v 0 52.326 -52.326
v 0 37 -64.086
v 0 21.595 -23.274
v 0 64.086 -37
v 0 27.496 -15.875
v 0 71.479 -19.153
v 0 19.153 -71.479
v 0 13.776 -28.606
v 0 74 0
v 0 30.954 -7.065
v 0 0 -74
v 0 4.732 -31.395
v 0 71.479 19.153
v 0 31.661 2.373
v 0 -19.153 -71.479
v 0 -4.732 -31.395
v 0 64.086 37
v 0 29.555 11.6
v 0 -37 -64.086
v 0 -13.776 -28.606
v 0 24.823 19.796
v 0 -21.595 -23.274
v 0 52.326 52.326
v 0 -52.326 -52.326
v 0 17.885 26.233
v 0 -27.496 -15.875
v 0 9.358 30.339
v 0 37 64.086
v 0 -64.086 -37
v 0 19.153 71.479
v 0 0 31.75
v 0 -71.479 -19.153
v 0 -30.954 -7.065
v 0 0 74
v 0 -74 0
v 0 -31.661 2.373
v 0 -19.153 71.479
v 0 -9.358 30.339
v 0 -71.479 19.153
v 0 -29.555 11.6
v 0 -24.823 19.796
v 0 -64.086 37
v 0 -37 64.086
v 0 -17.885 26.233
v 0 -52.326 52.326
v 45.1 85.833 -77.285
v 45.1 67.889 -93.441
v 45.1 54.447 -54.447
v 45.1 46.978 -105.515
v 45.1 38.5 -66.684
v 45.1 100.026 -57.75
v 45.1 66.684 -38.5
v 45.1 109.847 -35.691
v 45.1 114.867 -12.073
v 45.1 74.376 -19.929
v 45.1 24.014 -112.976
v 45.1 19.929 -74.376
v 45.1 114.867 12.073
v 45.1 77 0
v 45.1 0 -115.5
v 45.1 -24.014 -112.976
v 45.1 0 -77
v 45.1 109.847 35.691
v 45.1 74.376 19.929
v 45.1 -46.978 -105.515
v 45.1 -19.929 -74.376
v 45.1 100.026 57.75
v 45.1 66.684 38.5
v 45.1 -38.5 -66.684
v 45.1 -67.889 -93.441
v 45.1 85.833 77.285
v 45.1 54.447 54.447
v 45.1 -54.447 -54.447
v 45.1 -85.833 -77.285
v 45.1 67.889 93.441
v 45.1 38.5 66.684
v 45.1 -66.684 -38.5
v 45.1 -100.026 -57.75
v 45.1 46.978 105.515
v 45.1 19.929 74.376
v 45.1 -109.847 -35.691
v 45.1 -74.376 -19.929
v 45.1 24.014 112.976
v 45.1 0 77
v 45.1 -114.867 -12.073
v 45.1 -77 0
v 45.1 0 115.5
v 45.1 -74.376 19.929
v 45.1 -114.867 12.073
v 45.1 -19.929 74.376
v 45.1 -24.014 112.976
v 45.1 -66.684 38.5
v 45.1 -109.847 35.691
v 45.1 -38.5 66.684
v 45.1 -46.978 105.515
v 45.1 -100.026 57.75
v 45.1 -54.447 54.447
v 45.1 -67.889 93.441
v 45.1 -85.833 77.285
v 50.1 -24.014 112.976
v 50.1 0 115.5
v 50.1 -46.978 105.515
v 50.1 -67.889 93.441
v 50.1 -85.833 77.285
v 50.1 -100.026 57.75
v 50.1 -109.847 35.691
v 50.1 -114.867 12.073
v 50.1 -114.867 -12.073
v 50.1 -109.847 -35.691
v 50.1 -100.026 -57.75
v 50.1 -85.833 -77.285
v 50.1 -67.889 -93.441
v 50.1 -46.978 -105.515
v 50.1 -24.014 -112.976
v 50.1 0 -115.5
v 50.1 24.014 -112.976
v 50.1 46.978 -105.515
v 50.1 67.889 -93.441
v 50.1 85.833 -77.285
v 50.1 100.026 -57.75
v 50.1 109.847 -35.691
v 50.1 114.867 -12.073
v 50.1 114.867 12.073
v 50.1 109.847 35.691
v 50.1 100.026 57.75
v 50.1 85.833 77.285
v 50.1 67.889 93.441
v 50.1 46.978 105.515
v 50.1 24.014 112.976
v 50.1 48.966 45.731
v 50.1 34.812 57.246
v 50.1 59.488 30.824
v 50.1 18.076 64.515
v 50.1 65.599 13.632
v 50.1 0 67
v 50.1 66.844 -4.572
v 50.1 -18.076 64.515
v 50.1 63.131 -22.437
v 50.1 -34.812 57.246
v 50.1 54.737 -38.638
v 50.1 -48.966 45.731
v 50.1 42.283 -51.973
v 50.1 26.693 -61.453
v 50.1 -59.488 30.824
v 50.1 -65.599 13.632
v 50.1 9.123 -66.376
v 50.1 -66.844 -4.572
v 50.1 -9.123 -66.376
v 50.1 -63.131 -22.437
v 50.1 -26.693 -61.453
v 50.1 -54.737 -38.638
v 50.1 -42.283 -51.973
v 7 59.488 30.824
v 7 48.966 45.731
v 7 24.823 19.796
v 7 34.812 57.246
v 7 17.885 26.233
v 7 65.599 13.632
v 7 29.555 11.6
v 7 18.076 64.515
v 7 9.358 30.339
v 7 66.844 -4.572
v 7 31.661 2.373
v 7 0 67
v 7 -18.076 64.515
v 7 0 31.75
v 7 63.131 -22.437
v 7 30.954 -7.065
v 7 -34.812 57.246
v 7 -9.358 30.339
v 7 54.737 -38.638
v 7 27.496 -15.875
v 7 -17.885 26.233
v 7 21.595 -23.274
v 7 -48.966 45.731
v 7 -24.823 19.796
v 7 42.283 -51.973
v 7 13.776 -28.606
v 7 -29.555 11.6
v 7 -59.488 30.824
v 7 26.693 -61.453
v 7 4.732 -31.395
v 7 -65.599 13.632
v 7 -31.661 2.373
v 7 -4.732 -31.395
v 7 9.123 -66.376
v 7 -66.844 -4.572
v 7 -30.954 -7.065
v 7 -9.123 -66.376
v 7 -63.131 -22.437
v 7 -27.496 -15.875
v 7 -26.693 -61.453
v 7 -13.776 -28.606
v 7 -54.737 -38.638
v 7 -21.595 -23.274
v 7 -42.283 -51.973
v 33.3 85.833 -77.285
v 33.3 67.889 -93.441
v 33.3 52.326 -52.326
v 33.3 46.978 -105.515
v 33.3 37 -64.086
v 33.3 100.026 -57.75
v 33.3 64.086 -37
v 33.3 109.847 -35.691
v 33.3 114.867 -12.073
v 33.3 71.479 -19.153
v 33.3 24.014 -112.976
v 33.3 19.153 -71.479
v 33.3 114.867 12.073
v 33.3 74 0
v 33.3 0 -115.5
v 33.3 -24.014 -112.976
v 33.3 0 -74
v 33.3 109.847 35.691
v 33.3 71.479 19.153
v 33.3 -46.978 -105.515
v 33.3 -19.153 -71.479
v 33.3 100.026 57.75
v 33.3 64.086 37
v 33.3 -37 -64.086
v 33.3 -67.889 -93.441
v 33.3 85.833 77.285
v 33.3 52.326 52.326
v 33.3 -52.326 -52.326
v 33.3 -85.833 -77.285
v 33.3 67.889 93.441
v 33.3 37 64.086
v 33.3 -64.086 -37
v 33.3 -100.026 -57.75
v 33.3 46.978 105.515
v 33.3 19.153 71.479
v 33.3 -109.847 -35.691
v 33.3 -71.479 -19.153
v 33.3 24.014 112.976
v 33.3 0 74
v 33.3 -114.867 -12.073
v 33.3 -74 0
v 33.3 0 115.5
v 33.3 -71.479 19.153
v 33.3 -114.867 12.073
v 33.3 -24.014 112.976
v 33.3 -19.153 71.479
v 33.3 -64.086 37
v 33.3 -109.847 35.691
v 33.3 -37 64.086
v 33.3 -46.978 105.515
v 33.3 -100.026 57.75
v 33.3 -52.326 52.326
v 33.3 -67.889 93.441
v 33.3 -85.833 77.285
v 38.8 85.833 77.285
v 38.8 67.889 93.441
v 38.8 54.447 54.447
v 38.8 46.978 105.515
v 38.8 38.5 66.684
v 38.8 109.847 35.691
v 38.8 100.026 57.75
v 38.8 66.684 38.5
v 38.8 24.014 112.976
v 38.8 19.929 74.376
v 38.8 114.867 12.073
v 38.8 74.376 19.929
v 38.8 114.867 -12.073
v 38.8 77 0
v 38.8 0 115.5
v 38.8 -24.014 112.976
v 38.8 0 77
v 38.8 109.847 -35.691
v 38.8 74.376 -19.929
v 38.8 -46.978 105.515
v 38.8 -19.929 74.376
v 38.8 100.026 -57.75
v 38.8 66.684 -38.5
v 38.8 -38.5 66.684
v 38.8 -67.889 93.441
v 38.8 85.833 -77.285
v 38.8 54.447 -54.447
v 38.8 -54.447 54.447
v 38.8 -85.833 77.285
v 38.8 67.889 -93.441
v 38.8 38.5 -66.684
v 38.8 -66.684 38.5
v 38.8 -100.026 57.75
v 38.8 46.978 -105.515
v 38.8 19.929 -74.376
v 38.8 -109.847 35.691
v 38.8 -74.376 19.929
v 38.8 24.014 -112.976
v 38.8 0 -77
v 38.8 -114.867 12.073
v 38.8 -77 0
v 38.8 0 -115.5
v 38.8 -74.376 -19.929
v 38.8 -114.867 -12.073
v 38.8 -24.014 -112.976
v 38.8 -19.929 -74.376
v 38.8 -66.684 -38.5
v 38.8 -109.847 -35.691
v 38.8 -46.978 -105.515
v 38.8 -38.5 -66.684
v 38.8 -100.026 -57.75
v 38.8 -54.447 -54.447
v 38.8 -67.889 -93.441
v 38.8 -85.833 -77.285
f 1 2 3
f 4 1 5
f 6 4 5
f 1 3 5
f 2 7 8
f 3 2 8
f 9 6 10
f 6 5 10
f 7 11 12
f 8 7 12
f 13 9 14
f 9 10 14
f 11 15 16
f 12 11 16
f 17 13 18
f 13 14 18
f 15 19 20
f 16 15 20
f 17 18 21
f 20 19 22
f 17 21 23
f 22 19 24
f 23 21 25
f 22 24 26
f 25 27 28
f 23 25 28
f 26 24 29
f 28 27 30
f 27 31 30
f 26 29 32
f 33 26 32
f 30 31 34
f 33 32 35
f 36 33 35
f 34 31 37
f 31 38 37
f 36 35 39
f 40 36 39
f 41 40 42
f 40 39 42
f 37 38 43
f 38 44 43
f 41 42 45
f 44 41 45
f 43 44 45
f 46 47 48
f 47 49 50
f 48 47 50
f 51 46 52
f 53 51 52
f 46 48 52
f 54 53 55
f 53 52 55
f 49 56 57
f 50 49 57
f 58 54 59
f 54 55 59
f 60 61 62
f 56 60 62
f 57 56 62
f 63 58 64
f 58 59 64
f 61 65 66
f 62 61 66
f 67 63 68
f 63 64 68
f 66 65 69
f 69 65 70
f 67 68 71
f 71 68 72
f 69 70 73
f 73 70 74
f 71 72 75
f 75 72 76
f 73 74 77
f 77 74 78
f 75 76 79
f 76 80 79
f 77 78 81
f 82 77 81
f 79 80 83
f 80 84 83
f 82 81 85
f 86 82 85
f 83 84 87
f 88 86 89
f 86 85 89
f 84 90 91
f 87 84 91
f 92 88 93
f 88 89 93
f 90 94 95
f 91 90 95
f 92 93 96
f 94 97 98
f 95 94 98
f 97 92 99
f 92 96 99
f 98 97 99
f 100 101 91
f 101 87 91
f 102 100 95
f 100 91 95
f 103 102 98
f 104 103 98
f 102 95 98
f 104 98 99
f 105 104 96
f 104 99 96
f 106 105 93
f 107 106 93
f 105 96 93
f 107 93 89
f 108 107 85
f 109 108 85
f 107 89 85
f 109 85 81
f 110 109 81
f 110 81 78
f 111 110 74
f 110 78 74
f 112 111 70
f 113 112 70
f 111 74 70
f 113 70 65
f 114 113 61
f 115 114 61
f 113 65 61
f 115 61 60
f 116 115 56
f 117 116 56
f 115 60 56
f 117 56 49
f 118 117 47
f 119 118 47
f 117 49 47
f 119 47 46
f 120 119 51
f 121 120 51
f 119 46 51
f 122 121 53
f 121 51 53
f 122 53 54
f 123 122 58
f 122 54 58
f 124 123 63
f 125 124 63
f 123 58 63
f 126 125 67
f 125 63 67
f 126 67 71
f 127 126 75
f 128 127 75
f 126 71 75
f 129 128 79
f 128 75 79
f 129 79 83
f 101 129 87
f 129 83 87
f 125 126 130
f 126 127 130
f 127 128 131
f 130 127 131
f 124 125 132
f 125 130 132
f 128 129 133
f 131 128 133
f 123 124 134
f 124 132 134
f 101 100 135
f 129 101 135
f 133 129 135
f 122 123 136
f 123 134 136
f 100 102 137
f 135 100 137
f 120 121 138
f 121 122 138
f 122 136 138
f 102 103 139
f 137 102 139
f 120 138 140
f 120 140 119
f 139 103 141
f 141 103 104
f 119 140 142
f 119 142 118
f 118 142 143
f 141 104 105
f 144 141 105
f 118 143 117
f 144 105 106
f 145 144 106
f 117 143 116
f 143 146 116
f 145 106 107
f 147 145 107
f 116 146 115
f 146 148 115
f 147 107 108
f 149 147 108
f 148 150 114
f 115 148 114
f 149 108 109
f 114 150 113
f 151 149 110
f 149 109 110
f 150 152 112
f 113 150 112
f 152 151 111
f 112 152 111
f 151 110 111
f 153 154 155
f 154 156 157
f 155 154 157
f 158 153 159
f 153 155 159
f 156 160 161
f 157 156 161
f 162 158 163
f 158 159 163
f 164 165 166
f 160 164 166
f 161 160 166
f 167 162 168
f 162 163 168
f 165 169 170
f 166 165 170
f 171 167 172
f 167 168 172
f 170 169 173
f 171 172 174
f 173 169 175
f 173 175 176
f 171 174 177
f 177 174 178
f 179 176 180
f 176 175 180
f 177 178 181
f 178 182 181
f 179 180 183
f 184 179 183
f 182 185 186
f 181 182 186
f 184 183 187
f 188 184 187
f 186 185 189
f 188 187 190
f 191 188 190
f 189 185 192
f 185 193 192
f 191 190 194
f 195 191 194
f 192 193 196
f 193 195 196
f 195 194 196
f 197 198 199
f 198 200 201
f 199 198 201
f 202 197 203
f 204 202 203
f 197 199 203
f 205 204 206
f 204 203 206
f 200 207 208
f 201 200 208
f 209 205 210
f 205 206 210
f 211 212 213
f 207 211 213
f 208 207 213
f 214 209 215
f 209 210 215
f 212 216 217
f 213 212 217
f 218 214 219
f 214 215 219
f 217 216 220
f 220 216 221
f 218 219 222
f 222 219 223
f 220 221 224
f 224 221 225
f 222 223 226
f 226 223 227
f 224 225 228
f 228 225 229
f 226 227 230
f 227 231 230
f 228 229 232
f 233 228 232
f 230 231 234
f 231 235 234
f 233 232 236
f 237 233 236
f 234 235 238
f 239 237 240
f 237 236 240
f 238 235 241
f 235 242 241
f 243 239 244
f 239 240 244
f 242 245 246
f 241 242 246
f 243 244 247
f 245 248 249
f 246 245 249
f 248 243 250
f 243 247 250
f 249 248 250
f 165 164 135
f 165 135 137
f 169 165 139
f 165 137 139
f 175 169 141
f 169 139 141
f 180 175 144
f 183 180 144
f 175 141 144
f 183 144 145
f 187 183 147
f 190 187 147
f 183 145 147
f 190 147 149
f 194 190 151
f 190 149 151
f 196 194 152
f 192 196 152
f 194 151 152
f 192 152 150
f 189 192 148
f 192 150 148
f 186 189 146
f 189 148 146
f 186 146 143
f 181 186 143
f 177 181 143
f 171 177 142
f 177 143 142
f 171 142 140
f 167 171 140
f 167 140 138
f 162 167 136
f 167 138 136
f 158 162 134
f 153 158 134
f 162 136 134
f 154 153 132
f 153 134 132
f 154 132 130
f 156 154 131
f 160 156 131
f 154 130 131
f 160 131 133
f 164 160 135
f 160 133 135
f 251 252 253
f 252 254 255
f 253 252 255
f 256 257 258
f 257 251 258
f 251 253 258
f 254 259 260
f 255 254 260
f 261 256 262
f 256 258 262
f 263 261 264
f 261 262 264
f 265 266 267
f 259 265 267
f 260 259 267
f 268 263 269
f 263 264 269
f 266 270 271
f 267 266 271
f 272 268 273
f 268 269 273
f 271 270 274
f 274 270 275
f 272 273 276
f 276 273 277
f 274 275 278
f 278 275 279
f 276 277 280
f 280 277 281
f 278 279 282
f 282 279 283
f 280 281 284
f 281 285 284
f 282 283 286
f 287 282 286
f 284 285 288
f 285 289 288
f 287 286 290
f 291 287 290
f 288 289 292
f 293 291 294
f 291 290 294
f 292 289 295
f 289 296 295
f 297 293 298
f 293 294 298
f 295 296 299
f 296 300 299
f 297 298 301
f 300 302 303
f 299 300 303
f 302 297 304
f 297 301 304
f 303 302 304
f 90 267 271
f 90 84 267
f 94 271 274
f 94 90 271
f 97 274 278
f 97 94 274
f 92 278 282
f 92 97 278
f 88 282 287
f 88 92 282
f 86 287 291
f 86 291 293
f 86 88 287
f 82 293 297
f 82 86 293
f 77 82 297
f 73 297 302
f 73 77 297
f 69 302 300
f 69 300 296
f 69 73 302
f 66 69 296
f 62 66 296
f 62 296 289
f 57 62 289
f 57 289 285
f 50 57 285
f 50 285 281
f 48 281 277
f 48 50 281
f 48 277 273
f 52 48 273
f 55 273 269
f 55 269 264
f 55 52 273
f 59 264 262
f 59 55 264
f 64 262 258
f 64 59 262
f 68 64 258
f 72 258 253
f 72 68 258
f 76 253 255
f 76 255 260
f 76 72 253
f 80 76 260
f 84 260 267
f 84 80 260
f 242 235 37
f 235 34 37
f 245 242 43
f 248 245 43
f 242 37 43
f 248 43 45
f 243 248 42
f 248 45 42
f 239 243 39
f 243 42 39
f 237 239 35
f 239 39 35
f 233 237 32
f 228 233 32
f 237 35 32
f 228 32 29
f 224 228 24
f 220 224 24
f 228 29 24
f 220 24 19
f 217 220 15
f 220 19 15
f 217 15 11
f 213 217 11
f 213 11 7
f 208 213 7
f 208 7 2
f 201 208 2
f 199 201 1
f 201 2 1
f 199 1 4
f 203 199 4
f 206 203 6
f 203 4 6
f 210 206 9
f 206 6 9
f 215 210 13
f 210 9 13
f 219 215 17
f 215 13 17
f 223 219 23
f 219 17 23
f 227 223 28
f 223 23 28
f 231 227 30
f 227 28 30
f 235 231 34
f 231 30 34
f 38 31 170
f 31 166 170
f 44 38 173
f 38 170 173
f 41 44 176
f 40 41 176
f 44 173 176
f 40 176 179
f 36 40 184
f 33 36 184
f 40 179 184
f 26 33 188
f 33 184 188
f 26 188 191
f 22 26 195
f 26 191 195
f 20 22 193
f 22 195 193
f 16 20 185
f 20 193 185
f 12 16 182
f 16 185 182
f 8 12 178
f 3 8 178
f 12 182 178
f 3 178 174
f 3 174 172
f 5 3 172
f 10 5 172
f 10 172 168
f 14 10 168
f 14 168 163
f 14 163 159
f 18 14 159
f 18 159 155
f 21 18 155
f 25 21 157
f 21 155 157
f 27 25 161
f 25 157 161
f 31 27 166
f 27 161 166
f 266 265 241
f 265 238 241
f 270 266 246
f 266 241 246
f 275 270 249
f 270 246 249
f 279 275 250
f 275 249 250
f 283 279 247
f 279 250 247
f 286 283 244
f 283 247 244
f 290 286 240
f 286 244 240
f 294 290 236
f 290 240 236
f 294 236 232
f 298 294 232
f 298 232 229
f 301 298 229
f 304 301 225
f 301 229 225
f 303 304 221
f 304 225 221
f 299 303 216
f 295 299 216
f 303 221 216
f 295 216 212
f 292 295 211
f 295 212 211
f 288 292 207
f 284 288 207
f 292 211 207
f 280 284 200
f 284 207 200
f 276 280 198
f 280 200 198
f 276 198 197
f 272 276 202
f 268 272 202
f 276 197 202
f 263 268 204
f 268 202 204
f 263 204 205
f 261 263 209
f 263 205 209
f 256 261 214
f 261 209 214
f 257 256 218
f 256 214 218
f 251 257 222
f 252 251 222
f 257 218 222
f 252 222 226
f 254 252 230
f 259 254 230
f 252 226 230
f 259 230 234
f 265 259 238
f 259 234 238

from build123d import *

# Parameters (mm, degrees)
F0_W = 6.3
F0_H = 10


with BuildPart() as f1:
    # F0 (on Front) → F1 (revolve)
    with BuildSketch(Plane.XZ):
        Polygon((0, 74), (0, 31.75), (7, 31.75), (7, 67), (33.3, 67), (33.3, 74), align=None)
        Polygon((33.3, 115.5), (33.3, 74), (33.3, 67), (38.8, 67), (38.8, 77), (38.8, 115.5), align=None)
        with Locations((41.95, 72)):
            Rectangle(F0_W, F0_H)
        Polygon((45.1, 77), (45.1, 67), (50.1, 67), (50.1, 115.5), (45.1, 115.5), align=None)
    revolve(axis=Axis((16.65, 0, 0), (1, 0, 0)))


solid = f1.part
